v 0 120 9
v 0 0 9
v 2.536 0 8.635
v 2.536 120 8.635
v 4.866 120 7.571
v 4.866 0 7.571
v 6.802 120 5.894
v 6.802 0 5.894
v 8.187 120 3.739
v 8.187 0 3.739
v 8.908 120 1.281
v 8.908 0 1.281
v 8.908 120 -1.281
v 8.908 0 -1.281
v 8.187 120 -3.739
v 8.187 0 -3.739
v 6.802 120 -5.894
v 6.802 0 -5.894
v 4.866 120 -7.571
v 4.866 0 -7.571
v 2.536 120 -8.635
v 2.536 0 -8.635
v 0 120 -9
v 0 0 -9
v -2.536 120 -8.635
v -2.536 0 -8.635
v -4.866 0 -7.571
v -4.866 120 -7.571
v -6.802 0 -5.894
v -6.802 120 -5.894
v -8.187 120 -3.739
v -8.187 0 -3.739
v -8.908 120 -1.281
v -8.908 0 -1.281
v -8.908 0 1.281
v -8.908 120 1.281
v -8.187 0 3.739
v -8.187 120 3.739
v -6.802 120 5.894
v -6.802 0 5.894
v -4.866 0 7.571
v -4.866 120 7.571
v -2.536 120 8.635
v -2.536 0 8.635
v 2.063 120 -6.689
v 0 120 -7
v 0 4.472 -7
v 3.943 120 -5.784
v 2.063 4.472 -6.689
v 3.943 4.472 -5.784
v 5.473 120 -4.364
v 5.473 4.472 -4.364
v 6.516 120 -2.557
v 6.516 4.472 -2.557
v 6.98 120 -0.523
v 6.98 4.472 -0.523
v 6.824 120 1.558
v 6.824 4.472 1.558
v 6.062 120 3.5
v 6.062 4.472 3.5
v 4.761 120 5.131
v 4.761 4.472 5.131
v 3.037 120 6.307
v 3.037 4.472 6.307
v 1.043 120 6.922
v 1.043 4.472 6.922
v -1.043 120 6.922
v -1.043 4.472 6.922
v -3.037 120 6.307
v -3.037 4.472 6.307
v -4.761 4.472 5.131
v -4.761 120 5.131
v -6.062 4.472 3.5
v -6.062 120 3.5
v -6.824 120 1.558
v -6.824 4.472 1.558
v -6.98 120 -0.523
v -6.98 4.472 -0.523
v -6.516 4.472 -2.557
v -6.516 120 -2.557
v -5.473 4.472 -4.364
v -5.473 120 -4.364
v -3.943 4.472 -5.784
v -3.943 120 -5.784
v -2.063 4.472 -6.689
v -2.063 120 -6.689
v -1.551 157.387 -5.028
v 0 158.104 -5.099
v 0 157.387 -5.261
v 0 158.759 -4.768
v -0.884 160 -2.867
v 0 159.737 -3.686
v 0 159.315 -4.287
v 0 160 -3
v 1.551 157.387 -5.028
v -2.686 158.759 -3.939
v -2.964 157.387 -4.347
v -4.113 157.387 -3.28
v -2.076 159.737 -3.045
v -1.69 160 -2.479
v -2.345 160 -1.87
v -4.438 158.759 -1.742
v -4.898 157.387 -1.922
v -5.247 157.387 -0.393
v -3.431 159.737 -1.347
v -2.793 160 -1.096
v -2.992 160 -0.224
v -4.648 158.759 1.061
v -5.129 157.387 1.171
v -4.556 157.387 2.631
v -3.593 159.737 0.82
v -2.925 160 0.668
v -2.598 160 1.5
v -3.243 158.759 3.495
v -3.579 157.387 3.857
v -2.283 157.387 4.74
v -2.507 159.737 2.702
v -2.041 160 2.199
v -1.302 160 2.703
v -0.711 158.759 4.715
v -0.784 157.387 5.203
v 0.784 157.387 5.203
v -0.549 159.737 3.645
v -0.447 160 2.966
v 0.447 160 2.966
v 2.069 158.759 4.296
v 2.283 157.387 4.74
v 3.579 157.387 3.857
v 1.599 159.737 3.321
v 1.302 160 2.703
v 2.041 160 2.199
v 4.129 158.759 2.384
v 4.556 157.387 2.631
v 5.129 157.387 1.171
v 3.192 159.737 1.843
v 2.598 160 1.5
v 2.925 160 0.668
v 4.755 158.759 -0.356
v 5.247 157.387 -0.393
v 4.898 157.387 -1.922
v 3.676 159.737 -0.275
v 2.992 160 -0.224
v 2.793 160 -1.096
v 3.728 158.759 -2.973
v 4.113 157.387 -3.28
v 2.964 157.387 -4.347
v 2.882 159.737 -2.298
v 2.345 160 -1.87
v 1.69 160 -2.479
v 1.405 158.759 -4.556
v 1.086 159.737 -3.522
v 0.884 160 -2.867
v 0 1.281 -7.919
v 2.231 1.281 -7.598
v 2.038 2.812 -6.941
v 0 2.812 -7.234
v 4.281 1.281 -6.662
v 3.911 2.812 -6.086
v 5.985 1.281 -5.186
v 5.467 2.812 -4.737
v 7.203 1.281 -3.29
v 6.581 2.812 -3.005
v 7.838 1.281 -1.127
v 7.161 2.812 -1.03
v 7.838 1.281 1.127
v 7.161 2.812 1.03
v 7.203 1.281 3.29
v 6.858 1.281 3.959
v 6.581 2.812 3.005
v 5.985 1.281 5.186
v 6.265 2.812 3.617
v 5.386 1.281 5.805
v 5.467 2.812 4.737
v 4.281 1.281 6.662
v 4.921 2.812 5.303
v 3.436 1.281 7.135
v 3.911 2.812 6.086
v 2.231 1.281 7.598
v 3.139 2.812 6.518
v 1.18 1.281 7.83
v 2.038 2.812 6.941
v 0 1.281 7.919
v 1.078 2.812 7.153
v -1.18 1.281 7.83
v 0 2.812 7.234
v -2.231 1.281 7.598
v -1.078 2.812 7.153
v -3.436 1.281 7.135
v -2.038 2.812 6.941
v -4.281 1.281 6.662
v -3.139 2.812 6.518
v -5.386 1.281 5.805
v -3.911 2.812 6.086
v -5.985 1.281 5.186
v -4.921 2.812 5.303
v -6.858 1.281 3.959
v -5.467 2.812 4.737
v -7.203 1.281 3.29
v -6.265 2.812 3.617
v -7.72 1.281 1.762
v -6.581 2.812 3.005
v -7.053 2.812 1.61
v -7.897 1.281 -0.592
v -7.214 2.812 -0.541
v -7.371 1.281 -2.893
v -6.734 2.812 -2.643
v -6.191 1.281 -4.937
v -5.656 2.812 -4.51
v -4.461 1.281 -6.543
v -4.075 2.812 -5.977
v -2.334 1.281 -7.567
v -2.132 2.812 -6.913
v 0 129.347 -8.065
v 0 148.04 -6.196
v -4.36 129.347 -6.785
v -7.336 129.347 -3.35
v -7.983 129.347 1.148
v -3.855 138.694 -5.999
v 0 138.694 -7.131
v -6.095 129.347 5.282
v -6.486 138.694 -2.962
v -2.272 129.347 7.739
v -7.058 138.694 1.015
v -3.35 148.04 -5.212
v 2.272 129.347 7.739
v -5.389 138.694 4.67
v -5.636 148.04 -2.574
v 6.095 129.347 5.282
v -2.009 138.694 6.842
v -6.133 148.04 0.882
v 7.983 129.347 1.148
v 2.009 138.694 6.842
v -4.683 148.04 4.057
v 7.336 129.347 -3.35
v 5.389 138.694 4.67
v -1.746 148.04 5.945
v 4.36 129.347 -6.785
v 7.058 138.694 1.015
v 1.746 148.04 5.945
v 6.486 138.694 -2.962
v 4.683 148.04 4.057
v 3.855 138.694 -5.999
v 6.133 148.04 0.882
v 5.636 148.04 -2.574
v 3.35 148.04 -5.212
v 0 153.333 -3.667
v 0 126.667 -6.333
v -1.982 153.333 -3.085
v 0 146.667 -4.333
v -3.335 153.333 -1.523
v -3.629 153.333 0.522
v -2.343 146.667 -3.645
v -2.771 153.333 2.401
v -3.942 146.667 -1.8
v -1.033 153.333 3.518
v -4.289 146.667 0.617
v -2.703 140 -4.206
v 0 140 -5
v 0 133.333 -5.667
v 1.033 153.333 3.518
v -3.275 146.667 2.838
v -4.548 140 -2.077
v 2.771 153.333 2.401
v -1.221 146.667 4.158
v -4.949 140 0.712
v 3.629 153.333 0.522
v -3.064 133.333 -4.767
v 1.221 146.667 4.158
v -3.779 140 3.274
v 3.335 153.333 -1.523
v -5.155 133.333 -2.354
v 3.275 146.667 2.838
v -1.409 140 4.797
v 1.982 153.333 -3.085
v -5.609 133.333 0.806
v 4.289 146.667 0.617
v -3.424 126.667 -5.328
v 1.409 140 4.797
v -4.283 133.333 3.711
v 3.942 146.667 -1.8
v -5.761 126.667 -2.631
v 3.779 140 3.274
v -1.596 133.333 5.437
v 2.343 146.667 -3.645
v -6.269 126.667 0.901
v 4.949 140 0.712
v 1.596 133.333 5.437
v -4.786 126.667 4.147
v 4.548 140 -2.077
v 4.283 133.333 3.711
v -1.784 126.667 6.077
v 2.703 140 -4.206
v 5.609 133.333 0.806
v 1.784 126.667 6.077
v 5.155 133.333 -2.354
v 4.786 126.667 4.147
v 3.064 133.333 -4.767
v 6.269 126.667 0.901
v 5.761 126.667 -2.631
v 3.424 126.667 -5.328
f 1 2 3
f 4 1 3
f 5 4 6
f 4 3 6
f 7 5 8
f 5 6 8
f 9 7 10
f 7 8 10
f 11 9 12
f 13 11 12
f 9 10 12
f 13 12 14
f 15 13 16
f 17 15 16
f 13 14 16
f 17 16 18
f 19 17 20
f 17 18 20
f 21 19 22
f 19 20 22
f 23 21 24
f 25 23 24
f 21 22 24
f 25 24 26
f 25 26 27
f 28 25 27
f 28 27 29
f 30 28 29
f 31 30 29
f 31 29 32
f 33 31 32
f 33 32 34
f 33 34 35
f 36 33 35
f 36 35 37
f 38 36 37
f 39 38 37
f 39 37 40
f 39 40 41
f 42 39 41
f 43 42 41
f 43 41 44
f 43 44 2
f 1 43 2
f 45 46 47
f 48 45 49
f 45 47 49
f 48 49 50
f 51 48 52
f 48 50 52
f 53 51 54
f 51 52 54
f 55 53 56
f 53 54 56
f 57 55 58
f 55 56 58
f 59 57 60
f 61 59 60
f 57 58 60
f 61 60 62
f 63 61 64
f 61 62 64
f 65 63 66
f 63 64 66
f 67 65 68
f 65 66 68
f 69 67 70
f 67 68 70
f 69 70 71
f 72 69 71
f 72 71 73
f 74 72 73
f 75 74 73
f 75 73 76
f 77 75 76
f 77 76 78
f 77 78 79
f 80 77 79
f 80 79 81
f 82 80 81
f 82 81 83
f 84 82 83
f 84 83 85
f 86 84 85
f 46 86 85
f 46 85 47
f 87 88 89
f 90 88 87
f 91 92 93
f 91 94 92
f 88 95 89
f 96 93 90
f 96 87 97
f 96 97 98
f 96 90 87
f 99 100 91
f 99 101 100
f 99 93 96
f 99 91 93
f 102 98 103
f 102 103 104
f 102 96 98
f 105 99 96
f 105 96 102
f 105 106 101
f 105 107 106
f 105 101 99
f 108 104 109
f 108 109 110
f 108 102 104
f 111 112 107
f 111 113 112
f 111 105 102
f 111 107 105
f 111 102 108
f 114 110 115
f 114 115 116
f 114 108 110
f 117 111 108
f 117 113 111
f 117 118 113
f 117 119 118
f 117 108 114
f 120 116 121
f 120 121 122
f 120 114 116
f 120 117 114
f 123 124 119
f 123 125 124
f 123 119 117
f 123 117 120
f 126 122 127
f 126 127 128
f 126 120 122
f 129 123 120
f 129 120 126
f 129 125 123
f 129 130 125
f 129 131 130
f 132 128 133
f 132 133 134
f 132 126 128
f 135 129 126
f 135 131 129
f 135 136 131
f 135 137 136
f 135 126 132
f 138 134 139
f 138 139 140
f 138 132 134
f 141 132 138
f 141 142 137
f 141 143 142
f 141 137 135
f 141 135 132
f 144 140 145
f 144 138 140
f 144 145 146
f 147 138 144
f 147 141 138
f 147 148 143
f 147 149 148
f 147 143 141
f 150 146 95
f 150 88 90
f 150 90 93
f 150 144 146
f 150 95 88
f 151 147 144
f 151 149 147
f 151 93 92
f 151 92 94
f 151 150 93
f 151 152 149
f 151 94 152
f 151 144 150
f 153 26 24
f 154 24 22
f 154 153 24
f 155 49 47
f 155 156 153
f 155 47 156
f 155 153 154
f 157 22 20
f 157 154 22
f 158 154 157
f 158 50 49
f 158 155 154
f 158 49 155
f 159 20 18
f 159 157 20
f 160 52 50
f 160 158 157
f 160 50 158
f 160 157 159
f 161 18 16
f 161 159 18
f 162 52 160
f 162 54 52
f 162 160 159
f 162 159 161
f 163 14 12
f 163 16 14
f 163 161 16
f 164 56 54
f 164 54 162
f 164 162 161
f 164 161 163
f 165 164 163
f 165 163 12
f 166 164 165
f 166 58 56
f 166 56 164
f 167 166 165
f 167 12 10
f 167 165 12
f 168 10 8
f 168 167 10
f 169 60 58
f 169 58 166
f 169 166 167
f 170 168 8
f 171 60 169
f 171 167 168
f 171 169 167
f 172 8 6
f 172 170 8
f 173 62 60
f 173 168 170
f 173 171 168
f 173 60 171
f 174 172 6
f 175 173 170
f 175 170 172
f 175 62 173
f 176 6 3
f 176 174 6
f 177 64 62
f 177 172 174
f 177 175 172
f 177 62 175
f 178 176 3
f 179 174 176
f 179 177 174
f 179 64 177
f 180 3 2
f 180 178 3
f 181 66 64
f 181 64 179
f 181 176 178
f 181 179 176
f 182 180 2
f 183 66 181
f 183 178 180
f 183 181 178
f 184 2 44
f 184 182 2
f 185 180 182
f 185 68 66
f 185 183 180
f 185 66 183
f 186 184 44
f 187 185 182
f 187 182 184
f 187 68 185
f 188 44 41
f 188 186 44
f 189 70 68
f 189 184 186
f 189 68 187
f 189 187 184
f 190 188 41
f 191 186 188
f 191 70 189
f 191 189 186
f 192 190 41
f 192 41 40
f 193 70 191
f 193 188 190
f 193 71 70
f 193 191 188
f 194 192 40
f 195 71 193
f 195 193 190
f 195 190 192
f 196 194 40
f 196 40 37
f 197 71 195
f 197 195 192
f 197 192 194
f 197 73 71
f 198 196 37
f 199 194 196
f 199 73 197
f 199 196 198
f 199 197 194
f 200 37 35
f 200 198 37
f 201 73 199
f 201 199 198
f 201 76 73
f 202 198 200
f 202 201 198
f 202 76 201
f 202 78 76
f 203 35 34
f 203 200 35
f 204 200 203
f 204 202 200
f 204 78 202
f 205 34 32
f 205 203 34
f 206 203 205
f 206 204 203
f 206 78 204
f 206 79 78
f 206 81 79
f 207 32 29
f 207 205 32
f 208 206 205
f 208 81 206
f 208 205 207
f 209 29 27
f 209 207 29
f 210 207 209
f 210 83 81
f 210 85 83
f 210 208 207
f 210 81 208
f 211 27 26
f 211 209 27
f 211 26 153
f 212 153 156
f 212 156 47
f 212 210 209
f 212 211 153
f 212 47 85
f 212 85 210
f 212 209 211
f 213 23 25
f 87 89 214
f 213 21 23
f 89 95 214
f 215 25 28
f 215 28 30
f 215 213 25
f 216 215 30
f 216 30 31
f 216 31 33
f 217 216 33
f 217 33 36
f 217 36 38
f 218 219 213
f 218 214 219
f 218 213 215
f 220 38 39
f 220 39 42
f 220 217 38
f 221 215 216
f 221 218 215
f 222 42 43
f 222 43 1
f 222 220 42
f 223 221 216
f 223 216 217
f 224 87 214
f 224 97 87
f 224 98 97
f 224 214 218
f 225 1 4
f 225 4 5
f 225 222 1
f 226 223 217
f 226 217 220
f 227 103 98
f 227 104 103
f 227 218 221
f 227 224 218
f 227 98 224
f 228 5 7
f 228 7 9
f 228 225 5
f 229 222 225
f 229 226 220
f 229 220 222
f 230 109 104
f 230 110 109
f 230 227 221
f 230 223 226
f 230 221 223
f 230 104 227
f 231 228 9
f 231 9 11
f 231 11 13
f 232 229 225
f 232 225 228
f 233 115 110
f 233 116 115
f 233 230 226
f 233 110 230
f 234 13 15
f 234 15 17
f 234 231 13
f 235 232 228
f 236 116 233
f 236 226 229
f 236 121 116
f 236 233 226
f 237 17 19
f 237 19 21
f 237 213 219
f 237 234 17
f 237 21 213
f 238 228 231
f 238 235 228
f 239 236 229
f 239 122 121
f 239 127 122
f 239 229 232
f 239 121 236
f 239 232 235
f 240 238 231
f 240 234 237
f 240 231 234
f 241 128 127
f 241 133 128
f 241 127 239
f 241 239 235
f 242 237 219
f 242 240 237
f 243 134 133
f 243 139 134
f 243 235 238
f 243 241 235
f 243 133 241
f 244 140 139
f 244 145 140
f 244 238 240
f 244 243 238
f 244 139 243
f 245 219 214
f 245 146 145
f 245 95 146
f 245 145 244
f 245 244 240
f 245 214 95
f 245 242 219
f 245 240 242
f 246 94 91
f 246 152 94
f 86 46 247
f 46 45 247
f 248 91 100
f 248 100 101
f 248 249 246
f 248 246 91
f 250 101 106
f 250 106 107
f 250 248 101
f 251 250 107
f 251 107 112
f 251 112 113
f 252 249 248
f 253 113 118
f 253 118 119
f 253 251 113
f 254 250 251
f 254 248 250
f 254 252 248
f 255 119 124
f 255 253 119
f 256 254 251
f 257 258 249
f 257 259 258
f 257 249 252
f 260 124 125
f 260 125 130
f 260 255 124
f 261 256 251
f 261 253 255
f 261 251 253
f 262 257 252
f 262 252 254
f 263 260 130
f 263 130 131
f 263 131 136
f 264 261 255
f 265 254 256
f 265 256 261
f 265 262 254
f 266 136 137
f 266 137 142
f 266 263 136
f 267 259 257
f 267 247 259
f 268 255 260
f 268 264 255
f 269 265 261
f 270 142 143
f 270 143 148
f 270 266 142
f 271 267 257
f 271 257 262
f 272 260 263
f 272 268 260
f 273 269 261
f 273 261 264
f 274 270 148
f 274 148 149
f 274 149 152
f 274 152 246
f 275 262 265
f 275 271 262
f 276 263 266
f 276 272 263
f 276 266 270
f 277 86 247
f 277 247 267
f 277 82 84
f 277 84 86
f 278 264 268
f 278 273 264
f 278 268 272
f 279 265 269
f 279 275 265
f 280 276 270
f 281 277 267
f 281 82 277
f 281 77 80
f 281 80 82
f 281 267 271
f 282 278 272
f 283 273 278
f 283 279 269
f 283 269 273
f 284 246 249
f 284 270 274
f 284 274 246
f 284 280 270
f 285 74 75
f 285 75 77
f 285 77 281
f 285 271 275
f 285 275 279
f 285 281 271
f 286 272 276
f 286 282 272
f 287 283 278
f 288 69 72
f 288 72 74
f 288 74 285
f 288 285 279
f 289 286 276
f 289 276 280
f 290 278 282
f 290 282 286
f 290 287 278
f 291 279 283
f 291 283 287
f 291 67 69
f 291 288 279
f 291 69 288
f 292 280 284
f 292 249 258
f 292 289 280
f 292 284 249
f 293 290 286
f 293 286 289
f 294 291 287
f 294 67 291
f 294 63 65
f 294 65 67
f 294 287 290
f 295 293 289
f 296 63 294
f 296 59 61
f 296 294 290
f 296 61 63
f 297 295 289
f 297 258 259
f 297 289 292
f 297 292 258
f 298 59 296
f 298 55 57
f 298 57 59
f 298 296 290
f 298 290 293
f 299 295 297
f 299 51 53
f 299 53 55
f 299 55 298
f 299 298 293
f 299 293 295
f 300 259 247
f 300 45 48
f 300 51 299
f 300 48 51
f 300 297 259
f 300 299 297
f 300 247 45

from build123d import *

# Parameters (mm, degrees)
SKETCH1_R           = 9
BOSS_EXTRUDE1_DEPTH = 120
SKETCH2_R           = 7
CUT_EXTRUDE1_DEPTH  = 120
FILLET5_R           = 3
FILLET6_R           = 6


with BuildPart() as part:
    # Sketch1 → Boss-Extrude1 (new body)
    with BuildSketch(Plane(origin=(0, 0, 0), x_dir=(1, 0, 0), z_dir=(0, 1, 0))):
        with Locations(Location((0, 0, 0), (0, 0, 270))):
            Circle(SKETCH1_R)
    extrude(amount=BOSS_EXTRUDE1_DEPTH)

    # Sketch2 → Cut-Extrude1 (cut)
    with BuildSketch(Plane.XZ):
        with Locations(Location((0, 0, 0), (0, 0, 270))):
            Circle(SKETCH2_R)
    extrude(amount=-CUT_EXTRUDE1_DEPTH, mode=Mode.SUBTRACT)

    # Sketch3 → Revolve1 (revolve)
    with BuildSketch(Plane.XY, mode=Mode.PRIVATE) as revolve1_sk:
        Polygon((9, 120), (4.9999999999999964, 160), (2.999999999999999, 160), (6.999999999999999, 120), align=None)
    revolve(revolve1_sk.sketch.rotate(Axis((0, 0, 0), (0, 1, 0)), 90), axis=Axis((0, 0, 0), (0, 1, 0)))

    # Fillet5
    # the kernel refuses this fillet: 3 mm, written as the material it takes off along each edge
    with BuildSketch(Plane(origin=(0, 160, 0), x_dir=(1.1e-16, 0, -1), z_dir=(1, 0, 1.1e-16))) as fillet5_piece_1:
        with BuildLine():
            CenterArc((2.276174333017459, -2.9113701935372944), FILLET5_R, 5.710593137499507, 70.32758962785506)
            Line((2.9999999999999947, -2.842e-14), (3.014476513339645, 0.0582274038707169))
            ThreePointArc((3.014476513339645, 0.0582274038707169), (3.9999999999999956, 0.06000000000000227), (4.9999999999999964, 0.06000000000000227))
            Line((4.9999999999999964, 0.06000000000000227), (5.0597022314125955, 0.00597022314124729))
            Line((5.0597022314125955, 0.00597022314124729), (5.320988135060026, -2.6068888133330574))
            Line((5.320988135060026, -2.6068888133330574), (5.261285903647427, -2.6128590364743047))
        make_face()
    revolve(axis=Axis((0, 160, 0), (0, 1, 0)), mode=Mode.SUBTRACT)

    # Fillet6
    # the kernel refuses this fillet: 6 mm, written as the material it takes off along each edge
    with BuildSketch(Plane(origin=(0, 0, 0), x_dir=(-1.8e-16, 0, -1), z_dir=(-1, 0, 1.8e-16))) as fillet6_piece_1:
        with BuildLine():
            CenterArc((13, -4.47213595499958), FILLET6_R, 131.81031489577862, 48.18968510422138)
            Line((7, -4.47213595499958), (6.88, -4.47213595499958))
            Line((6.88, -4.47213595499958), (6.88, 0))
            Line((6.88, 0), (7, 0.12))
            ThreePointArc((7, 0.12), (8, 0.12), (8.92, 0.08944271909999159))
            Line((8.92, 0.08944271909999159), (9, 0))
        make_face()
    revolve(axis=Axis((0, 0, 0), (0, -1, 0)), mode=Mode.SUBTRACT)


solid = part.part
